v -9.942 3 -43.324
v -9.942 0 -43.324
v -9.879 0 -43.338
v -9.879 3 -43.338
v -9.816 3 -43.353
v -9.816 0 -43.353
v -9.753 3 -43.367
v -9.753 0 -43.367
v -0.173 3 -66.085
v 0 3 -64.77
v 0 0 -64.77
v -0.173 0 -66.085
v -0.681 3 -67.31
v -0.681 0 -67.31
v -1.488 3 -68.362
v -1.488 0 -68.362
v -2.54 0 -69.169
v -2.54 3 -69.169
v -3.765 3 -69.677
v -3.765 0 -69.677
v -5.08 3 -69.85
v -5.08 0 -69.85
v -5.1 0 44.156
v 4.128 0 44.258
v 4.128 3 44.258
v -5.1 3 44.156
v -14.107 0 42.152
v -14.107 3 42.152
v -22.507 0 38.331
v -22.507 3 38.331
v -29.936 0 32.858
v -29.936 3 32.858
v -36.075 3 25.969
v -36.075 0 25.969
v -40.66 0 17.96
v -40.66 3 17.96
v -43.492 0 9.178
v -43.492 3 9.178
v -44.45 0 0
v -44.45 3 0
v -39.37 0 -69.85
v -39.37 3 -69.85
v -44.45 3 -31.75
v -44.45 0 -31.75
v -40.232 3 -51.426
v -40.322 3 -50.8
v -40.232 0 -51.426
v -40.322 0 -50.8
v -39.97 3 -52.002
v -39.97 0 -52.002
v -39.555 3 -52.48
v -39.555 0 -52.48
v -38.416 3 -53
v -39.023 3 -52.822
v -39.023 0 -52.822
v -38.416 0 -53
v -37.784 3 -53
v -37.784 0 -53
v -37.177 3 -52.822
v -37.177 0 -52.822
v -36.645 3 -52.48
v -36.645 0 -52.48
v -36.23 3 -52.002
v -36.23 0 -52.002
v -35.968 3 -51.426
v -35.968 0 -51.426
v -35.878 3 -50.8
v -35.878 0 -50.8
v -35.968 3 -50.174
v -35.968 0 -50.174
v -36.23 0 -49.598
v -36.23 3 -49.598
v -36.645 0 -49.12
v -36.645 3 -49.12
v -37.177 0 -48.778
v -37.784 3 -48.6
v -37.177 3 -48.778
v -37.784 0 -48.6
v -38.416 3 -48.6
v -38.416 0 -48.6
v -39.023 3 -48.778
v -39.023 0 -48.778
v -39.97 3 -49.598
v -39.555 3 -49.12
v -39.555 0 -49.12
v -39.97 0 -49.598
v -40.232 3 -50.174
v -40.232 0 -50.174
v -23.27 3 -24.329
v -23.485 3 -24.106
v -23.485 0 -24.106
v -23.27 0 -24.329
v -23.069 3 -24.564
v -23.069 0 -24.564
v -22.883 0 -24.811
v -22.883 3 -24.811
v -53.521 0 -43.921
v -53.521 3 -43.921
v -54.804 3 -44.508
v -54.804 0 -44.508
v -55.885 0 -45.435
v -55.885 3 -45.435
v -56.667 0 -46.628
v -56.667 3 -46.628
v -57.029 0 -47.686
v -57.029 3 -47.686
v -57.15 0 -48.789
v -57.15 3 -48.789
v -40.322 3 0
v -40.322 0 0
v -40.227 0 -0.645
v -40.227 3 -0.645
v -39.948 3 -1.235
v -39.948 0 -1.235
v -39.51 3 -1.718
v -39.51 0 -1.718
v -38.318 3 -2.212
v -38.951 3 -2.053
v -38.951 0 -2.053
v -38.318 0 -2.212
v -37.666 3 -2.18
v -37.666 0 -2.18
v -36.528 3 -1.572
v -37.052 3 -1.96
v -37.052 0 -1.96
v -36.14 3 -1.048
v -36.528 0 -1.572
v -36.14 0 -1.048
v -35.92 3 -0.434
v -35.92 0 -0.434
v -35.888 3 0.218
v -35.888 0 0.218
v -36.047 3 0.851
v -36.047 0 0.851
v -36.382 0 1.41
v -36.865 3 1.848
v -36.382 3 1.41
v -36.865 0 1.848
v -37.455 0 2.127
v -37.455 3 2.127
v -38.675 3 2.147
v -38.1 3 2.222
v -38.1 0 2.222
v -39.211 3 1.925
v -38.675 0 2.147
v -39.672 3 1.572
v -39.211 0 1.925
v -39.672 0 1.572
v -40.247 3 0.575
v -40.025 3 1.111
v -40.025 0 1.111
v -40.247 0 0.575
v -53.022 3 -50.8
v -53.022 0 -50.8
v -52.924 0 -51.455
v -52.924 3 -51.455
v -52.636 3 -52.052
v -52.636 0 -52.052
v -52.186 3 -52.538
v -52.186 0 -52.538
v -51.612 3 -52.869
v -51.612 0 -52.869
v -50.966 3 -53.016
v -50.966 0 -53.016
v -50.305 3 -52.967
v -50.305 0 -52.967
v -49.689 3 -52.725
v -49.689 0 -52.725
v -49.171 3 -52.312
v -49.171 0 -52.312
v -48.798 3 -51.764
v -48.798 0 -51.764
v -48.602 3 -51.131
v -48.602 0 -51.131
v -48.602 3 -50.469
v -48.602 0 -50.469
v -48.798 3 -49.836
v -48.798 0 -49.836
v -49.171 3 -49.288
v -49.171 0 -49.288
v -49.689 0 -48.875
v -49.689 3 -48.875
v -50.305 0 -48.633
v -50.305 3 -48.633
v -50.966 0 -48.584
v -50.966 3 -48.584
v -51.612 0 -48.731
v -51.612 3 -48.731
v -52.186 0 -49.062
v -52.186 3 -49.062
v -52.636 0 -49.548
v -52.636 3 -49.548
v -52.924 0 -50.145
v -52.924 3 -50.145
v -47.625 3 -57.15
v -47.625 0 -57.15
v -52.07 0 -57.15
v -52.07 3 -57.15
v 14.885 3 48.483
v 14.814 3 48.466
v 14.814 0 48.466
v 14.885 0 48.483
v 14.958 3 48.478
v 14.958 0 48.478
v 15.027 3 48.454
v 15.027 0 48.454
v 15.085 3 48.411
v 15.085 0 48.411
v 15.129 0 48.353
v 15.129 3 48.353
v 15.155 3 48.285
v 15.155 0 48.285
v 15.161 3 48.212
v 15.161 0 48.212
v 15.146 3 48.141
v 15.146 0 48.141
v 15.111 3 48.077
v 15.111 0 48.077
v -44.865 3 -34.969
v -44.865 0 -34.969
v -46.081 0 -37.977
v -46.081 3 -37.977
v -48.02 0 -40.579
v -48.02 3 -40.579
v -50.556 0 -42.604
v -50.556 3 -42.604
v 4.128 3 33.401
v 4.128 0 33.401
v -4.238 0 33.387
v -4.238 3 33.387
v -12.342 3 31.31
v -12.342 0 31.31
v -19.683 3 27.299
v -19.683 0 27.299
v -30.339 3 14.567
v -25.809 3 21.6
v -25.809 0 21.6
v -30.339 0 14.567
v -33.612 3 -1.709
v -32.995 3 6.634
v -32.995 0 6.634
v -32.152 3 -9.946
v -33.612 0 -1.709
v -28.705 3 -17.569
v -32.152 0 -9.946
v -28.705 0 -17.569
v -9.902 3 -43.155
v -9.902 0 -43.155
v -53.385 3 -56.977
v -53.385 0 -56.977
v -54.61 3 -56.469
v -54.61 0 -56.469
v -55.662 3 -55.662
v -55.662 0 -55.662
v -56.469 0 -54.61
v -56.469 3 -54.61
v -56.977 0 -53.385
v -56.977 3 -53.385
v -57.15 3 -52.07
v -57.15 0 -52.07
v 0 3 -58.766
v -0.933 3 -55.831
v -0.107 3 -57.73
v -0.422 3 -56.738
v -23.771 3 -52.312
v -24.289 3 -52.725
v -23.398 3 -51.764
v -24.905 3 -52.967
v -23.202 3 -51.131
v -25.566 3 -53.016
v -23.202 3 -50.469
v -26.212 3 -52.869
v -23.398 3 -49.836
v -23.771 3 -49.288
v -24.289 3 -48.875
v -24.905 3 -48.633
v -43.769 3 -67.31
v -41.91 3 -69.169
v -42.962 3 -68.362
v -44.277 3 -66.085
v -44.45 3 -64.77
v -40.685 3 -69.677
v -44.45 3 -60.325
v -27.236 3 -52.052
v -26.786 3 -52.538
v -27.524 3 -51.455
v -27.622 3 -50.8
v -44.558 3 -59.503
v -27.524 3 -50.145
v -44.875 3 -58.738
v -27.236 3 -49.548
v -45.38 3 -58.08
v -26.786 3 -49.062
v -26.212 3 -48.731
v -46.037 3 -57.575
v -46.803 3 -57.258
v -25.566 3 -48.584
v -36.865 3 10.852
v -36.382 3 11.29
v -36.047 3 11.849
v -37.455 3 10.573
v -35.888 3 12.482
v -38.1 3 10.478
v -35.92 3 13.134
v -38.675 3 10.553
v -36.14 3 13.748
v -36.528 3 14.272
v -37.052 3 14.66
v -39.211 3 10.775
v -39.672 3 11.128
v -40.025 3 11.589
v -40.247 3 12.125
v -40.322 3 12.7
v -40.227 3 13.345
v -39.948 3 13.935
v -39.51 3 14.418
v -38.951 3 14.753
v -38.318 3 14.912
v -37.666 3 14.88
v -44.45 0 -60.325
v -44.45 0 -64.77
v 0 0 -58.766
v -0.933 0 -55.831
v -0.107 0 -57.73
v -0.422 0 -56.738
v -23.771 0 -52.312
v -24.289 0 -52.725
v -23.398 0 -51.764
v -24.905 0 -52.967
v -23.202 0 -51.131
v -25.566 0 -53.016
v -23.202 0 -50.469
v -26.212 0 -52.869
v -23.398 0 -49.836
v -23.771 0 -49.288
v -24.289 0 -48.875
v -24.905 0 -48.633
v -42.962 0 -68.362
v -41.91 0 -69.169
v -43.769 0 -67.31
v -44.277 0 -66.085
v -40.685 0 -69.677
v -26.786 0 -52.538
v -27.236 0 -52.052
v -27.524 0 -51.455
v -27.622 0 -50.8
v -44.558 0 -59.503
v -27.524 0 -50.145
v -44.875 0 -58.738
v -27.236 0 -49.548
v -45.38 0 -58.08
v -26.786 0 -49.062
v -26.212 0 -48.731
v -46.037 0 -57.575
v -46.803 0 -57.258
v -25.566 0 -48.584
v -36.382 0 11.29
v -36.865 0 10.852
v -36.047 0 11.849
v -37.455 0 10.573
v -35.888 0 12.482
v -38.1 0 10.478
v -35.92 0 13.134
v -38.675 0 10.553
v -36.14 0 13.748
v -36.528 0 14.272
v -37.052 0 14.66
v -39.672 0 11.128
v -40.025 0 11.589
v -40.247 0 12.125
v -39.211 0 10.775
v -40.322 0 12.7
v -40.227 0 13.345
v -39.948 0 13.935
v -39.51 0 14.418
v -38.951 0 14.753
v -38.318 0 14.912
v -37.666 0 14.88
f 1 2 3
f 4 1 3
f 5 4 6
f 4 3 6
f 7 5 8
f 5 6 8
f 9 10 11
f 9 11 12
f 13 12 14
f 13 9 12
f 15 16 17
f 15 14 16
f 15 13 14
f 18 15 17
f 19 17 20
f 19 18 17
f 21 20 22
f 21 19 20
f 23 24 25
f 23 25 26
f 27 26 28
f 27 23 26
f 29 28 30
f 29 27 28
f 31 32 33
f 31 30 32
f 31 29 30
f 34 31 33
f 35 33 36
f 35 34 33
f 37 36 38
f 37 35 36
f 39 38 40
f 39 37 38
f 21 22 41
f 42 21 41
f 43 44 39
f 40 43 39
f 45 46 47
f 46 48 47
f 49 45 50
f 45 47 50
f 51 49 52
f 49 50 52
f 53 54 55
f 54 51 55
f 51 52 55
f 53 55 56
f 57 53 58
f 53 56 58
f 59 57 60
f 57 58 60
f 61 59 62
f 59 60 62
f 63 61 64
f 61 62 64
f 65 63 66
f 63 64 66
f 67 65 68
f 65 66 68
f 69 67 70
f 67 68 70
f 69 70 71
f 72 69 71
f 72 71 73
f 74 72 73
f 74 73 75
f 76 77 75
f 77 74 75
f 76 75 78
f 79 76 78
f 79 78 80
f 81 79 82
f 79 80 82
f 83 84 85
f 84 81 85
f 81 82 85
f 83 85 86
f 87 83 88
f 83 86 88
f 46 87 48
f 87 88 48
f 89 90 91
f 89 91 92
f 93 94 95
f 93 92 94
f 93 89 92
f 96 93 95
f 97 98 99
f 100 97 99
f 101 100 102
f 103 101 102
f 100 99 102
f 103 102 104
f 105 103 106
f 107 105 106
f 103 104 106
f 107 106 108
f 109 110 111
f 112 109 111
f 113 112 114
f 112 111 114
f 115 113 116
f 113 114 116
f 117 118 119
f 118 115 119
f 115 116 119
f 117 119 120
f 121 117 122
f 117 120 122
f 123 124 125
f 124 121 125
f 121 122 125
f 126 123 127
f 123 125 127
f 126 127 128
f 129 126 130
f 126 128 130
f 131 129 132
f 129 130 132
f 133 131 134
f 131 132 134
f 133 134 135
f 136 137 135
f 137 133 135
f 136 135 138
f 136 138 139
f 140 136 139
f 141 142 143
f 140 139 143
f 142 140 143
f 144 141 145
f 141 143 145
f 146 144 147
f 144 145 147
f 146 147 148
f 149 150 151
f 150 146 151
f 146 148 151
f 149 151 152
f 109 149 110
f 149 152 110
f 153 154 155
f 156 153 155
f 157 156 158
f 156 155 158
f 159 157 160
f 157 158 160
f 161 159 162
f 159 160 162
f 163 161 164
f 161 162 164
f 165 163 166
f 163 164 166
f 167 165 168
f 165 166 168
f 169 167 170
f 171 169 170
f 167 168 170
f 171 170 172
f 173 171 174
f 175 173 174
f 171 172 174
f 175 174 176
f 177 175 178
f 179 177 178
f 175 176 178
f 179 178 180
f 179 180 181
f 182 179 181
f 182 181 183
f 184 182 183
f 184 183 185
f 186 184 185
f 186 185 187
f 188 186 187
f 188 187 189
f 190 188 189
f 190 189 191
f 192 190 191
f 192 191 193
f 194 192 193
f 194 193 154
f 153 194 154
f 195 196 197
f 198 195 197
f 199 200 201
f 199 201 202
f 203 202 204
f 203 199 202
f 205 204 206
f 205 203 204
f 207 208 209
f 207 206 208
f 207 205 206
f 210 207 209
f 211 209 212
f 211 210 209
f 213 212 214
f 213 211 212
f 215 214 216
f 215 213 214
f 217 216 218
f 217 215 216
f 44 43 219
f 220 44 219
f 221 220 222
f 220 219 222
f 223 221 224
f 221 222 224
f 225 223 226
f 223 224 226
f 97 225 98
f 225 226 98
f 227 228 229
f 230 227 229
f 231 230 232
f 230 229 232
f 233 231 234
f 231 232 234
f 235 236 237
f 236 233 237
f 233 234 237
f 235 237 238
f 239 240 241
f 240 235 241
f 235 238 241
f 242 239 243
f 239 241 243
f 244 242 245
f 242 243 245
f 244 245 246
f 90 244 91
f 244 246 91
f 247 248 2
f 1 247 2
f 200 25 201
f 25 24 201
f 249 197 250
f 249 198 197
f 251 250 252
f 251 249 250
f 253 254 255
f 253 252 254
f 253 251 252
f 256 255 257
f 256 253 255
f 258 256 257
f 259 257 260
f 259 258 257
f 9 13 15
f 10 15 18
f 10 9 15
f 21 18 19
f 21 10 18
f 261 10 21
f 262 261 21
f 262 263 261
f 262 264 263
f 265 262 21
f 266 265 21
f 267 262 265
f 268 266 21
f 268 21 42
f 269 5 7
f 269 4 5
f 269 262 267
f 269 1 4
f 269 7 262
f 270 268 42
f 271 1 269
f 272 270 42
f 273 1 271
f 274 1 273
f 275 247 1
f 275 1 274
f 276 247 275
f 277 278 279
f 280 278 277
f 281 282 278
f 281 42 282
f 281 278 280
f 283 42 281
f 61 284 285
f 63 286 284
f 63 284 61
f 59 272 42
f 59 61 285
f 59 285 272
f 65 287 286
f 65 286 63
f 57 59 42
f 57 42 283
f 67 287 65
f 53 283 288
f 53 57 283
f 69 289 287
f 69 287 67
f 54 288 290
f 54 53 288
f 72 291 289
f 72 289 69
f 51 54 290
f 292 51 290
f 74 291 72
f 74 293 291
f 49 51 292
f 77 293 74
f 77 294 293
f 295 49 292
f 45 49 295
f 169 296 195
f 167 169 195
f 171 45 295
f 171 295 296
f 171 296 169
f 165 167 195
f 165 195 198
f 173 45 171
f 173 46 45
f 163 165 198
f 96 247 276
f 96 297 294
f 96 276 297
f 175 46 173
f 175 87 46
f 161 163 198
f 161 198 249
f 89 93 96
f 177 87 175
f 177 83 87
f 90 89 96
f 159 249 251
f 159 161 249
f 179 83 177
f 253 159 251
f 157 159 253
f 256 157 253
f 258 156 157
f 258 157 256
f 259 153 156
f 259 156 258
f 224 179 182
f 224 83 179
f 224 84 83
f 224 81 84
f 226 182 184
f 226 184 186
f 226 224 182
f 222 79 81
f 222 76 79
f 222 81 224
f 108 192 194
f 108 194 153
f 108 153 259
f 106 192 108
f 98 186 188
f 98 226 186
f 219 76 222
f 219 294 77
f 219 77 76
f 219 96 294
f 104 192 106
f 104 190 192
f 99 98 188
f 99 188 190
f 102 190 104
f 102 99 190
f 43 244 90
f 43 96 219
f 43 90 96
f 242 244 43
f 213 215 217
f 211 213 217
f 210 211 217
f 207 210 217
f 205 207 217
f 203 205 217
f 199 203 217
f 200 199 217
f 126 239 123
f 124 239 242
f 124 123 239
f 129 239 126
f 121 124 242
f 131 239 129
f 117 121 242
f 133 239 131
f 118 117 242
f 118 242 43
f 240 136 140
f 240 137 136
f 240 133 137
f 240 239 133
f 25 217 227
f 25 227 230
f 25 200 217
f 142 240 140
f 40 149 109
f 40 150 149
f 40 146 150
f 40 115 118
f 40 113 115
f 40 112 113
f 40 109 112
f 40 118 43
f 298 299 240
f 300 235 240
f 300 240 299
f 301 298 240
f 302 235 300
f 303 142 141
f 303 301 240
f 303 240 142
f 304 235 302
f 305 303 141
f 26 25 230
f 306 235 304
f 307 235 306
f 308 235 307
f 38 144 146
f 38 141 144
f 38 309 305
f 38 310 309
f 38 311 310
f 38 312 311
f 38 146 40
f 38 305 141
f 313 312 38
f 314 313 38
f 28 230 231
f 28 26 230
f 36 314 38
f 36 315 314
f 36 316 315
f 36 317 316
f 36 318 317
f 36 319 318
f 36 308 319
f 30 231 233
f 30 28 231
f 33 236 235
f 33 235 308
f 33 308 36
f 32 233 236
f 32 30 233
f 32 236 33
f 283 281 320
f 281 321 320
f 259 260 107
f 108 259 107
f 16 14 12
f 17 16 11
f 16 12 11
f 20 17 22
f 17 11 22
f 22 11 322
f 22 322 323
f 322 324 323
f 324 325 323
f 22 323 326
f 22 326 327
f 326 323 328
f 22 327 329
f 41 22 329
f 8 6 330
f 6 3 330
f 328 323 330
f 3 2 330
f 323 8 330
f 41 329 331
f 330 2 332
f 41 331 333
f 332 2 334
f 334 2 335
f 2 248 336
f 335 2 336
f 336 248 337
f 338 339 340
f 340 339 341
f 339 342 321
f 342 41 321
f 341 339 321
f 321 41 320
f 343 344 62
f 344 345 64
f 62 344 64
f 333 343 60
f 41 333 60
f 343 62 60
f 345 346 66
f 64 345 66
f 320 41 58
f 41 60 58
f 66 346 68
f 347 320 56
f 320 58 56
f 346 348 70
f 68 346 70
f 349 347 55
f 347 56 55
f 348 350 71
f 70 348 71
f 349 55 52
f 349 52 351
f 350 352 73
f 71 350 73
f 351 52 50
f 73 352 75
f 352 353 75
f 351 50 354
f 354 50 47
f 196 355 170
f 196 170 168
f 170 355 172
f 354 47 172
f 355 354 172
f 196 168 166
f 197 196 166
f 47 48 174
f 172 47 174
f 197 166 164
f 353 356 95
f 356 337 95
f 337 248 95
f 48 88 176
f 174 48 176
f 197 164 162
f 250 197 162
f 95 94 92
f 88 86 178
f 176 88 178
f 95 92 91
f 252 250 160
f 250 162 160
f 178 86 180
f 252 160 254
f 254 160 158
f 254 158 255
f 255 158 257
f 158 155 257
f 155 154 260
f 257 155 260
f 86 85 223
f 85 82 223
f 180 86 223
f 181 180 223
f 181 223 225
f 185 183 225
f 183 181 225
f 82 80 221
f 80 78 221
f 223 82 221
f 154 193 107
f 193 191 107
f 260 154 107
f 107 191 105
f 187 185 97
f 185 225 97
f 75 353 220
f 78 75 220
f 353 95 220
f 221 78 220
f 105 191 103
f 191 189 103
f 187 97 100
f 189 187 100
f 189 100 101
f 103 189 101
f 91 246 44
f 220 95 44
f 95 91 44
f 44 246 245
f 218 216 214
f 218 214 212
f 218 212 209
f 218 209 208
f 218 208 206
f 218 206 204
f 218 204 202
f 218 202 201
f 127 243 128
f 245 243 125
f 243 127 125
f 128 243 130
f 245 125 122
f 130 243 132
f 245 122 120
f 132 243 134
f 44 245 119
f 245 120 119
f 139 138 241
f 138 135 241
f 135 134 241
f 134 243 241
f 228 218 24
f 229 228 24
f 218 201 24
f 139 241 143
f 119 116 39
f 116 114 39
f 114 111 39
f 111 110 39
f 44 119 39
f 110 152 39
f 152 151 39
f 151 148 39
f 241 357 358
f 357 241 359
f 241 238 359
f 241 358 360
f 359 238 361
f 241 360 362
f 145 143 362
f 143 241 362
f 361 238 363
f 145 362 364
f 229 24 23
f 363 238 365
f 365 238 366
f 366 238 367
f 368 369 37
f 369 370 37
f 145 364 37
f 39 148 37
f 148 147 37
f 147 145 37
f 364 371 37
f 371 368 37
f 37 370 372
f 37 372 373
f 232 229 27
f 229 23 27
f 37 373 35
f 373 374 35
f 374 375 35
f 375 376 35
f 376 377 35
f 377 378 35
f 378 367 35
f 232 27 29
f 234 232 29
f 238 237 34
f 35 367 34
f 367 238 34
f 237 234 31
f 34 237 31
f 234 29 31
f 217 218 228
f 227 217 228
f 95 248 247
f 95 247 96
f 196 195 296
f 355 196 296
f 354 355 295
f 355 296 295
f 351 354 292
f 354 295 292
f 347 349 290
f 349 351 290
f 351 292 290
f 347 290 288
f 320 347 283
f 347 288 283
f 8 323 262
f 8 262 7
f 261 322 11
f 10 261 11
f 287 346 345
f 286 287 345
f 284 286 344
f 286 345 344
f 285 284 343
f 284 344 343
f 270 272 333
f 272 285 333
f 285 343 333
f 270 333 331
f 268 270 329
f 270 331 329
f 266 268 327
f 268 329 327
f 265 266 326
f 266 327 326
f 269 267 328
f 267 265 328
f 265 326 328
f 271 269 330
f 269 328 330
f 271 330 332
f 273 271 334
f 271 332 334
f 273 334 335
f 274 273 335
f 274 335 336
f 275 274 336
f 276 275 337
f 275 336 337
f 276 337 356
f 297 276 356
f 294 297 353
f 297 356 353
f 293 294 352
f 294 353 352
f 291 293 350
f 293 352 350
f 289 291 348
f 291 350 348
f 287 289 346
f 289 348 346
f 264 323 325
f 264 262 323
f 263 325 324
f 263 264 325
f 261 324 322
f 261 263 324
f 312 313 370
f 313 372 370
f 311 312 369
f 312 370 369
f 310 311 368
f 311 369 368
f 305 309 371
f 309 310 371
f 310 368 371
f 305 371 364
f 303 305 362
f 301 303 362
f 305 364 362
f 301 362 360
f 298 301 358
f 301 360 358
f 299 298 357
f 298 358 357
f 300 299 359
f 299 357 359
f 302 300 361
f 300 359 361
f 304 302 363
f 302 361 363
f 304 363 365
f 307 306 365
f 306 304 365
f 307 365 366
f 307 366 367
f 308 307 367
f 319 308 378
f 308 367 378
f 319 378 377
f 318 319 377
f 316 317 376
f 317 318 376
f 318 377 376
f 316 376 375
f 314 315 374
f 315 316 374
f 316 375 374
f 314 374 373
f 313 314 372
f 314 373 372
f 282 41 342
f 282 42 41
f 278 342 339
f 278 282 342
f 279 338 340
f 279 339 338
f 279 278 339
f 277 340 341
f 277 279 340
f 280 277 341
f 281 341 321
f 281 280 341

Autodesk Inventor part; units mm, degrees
ref_plane "YZ Plane" through (0, 0, 0) normal (1, 0, 0) x (0, 1, 0)
ref_plane "XZ Plane" through (0, 0, 0) normal (0, 1, 0) x (-1, 0, 0)
ref_plane "XY Plane" through (0, 0, 0) normal (0, 0, 1) x (1, 0, 0)
sketch "Sketch1" plane through (0, 0, 0) normal (0, 1, 0) x (-1, 0, 0)
  circle A0 centre (0, 0) radius 33.655
  circle A1 centre (0, 0) radius 44.45
  line L0 (0, 44.45) -> (0, 33.655)
  line L1 (7.4782, -32.8136) -> (9.9419, -43.3239)
  line L2 (0, -44.45) -> (44.45, 0)
  line L3 (0, -44.45) -> (0, -69.85)
  line L4 (0, -69.85) -> (38.1, -69.85) construction
  line L5 (-4.1275, 44.258) -> (-4.1275, 33.4009)
  line L6 (-4.1275, 44.258) -> (-15.6469, 48.7936)
  line L7 (-15.6469, 48.7936) -> (-4.1275, 33.4009)
  line L8 (0, -69.85) -> (44.45, -69.85)
  line L9 (44.45, -69.85) -> (44.45, 0)
  line L10 (44.45, -69.85) -> (69.85, -69.85)
  line L11 (69.85, -69.85) -> (69.85, -44.45)
  line L12 (69.85, -44.45) -> (44.45, -44.45)
  line L13 (69.85, -44.45) -> (69.85, -50.8)
  line L14 (69.85, -50.8) -> (63.5, -50.8)
  circle A2 centre (63.5, -50.8) radius 2.2225
  line L15 (63.5, -50.8) -> (50.8, -50.8)
  circle A3 centre (50.8, -50.8) radius 2.2225
  line L16 (50.8, -50.8) -> (50.8, -63.5)
  circle A4 centre (50.8, -63.5) radius 2.2225
  line L17 (50.8, -63.5) -> (63.5, -63.5)
  circle A5 centre (63.5, -63.5) radius 2.2225
  line L18 (44.45, 0) -> (38.1, 0)
  circle A6 centre (38.1, 0) radius 2.2225
  line L19 (38.1, 0) -> (38.1, 12.7)
  circle A7 centre (38.1, 12.7) radius 2.2225
  line L20 (57.15, -69.85) -> (57.15, -44.45)
  line L21 (0, -57.15) -> (30.7326, -13.7174)
  line L22 (0, -57.15) -> (69.85, -57.15)
  line L23 (50.8, -50.8) -> (38.1, -50.8)
  circle A8 centre (38.1, -50.8) radius 2.2225
  line L24 (38.1, -50.8) -> (25.4, -50.8)
  circle A9 centre (25.4, -50.8) radius 2.2225
  point P0 (13.7174, -30.7326)
  point P1 (30.7326, -13.7174)
  point P2 (-11.3028, 42.9889)
  point P3 (23.1613, -24.4175)
  point P4 (9.9025, -43.1554)
  point P5 (9.7529, -43.3669)
  point P6 (57.15, -57.15)
  point P7 (44.45, -57.15)
  dimension "d0" = 67.31
  dimension "d1" = 88.9
  dimension "d23" = 44.45
  dimension "d24" = 6.35
  dimension "d25" = 6.35
  dimension "d26" = 4.445
  dimension "d27" = 12.7
  dimension "d28" = 4.445
  dimension "d29" = 12.7
  dimension "d30" = 4.445
  dimension "d31" = 12.7
  dimension "d32" = 4.445
  dimension "d35" = 6.35
  dimension "d36" = 4.445
  dimension "d37" = 12.7
  dimension "d38" = 4.445
  dimension "d47" = 12.7
  dimension "d48" = 4.445
  dimension "d49" = 12.7
  dimension "d50" = 4.445
extrude "Extrusion1" add sketch "Sketch1" along normal blind 3 contours A0 L0 A1 L2 | A0 L5 A1 L0 | L2 A1 L1 L21 A0 | L7 A1 L5 | L9 L22 L21 A1 | A1 L7 L6 | L12 L20 L15 A3 L23 L9 | L23 A3 L16 L22 L9 | L22 L9 L8 L3 | L20 L22 L16 A3 L15
sketch "Sketch3" plane through (0, 3, 0) normal (0, 1, 0) x (1, 0, 0)
  point P0 (0, 0)
fillet "Fillet3" radius 0.254 1 edges at (15.6469, 1.5, 48.7936)
fillet "Fillet5" radius 12.7 1 edges at (-44.45, 1.5, -44.45)
sketch "Sketch4" plane through (0, 3, 0) normal (0, 1, 0) x (1, 0, 0)
  point P0 (0, 0)
fillet "Fillet9" radius 5.08 1 edges at (0, 1.5, -69.85)
fillet "Fillet10" radius 5.08 1 edges at (0, 1.5, -57.15)
fillet "Fillet11" radius 5.08 1 edges at (-23.1613, 1.5, -24.4175)
fillet "Fillet12" radius 5.08 2 edges at (-57.1495, 1.5, -44.45) (-57.15, 1.5, -44.45)
fillet "Fillet14" radius 5.08 1 edges at (-57.15, 1.5, -57.15)
fillet "Fillet15" radius 5.08 1 edges at (-44.45, 1.5, -69.85)
fillet "Fillet16" radius 3.175 1 edges at (-44.45, 1.5, -57.15)
properties part number "Climb hook_3DPrint"
